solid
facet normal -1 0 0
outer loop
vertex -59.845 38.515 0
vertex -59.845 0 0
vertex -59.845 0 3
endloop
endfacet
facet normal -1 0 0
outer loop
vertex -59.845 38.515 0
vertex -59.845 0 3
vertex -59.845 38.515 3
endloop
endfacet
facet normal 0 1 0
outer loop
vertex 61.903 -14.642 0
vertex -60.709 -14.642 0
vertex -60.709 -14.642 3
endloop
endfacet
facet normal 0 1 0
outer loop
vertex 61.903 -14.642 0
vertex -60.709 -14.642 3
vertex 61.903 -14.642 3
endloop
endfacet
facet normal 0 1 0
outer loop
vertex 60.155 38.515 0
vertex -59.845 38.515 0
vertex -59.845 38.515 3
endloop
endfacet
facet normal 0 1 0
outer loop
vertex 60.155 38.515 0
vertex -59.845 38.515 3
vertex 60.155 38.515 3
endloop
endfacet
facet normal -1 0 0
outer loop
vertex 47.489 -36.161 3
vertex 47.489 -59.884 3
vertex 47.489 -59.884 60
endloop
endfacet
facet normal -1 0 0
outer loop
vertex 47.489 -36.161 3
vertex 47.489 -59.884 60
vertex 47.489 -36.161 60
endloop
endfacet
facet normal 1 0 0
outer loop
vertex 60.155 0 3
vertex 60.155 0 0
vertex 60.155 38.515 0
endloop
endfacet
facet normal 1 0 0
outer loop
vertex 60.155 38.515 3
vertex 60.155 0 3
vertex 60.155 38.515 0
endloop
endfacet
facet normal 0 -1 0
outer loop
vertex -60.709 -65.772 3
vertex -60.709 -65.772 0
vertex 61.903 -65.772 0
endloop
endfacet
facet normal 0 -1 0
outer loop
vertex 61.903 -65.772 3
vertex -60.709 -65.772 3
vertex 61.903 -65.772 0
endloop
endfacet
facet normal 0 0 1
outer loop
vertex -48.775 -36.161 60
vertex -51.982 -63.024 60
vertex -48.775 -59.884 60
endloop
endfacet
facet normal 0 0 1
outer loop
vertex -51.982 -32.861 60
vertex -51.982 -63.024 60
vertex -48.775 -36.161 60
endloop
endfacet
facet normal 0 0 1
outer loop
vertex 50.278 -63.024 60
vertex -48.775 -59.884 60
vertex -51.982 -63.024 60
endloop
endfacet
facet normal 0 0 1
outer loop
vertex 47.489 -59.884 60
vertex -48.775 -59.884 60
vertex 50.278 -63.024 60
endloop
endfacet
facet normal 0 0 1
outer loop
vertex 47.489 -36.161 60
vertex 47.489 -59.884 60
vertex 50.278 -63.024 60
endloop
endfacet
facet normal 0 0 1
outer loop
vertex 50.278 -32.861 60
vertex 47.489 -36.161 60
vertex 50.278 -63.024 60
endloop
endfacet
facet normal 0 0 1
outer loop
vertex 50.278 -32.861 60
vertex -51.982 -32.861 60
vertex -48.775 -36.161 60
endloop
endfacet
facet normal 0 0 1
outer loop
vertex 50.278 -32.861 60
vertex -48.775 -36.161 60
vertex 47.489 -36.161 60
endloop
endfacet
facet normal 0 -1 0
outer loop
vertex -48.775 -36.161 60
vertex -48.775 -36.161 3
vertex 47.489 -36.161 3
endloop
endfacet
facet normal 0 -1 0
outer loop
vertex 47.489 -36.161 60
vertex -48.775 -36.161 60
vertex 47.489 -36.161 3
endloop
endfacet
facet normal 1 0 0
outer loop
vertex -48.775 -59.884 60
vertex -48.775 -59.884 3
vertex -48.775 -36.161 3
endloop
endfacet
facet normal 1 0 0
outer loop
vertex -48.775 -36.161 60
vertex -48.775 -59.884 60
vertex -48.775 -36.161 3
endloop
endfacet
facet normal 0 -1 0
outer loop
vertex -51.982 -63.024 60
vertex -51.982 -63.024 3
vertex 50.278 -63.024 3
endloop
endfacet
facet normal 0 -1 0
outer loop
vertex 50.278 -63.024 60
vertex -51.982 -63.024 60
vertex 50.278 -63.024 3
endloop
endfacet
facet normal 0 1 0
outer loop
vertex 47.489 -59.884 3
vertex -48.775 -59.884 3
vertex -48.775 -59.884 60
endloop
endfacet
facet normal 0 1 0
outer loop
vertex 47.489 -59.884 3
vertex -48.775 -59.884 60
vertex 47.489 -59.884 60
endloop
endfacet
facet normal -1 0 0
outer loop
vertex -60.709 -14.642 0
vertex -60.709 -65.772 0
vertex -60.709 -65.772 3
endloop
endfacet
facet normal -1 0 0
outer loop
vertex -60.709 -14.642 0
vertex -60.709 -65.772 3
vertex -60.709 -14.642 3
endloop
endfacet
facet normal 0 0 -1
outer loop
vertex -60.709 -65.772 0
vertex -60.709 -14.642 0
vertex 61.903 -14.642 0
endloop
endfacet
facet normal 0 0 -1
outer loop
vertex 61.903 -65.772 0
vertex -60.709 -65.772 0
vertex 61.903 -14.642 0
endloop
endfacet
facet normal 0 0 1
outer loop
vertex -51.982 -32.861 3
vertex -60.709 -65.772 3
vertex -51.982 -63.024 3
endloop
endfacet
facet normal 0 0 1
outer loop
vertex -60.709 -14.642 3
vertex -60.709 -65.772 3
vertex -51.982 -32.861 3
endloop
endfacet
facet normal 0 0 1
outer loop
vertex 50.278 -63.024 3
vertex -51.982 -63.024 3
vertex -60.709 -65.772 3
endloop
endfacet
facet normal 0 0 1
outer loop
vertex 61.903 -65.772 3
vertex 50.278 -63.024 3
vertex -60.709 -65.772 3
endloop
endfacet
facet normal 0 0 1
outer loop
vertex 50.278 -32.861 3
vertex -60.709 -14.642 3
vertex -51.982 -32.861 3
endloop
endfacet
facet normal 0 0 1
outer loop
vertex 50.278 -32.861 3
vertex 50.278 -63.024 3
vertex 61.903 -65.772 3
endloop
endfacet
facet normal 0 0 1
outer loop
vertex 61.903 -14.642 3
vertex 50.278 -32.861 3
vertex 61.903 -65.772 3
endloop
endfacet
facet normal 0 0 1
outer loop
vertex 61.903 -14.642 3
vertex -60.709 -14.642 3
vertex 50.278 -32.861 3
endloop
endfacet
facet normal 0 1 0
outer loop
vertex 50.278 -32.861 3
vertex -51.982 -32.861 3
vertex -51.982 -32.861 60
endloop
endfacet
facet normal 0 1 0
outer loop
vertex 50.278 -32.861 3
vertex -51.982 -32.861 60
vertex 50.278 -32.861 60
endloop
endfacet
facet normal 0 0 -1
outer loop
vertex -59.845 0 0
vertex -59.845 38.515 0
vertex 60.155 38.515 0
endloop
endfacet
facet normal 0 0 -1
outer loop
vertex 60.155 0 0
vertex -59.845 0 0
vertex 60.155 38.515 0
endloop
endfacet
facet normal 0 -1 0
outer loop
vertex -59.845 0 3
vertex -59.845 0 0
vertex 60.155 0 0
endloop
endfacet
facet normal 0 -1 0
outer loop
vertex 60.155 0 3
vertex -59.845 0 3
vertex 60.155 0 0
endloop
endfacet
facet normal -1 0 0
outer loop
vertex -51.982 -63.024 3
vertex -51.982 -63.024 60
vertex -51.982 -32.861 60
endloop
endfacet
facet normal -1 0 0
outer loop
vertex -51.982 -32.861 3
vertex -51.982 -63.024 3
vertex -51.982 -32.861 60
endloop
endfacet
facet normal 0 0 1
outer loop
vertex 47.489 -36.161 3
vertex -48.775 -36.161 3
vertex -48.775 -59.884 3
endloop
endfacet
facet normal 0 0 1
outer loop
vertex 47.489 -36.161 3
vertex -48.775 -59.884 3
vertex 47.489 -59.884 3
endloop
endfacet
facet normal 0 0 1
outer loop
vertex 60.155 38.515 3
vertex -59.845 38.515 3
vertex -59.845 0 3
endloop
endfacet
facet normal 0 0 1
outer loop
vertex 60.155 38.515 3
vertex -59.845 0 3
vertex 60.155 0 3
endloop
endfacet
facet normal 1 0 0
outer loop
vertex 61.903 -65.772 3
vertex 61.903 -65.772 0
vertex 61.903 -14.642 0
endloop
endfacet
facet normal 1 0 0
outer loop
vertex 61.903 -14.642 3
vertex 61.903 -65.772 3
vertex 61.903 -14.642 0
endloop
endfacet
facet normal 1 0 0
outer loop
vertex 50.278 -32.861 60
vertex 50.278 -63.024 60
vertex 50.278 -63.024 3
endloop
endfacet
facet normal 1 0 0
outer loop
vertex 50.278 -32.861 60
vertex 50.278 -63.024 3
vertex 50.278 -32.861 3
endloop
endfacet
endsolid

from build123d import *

# Parameters (mm, degrees)
F0_W     = 120
F0_H     = 38.515401
F1_DEPTH = 3
F0_W_2   = 122.61183
F0_H_2   = 51.130004
F0_W_3   = 102.26
F0_H_3   = 30.163097
F2_DEPTH = 3
F0_W_4   = 96.263644
F0_H_4   = 23.723034
F3_DEPTH = 60
F4_DEPTH = 3


with BuildPart() as f1:
    # F0 (on Top) → F1 (new body)
    with BuildSketch(Plane.XY):
        with Locations((0.155082, 19.2577)):
            Rectangle(F0_W, F0_H)
    extrude(amount=F1_DEPTH)


with BuildPart() as f2:
    # F0 (on Top) → F2 (new body)
    with BuildSketch(Plane.XY):
        with Locations((0.596959, -40.206776)):
            Rectangle(F0_W_2, F0_H_2)
        with Locations((-0.852168, -47.942324)):
            Rectangle(F0_W_3, F0_H_3, mode=Mode.SUBTRACT)
    extrude(amount=F2_DEPTH)

    # F0 (on Top) → F3 (join)
    with BuildSketch(Plane.XY):
        with Locations((-0.852168, -47.942324)):
            Rectangle(F0_W_3, F0_H_3)
        with Locations((-0.642894, -48.022571)):
            Rectangle(F0_W_4, F0_H_4, mode=Mode.SUBTRACT)
    extrude(amount=F3_DEPTH)

    # F0 (on Top) → F4 (join)
    with BuildSketch(Plane.XY):
        with Locations((-0.642894, -48.022571)):
            Rectangle(F0_W_4, F0_H_4)
    extrude(amount=F4_DEPTH)


solid = Compound([f1.part, f2.part])
